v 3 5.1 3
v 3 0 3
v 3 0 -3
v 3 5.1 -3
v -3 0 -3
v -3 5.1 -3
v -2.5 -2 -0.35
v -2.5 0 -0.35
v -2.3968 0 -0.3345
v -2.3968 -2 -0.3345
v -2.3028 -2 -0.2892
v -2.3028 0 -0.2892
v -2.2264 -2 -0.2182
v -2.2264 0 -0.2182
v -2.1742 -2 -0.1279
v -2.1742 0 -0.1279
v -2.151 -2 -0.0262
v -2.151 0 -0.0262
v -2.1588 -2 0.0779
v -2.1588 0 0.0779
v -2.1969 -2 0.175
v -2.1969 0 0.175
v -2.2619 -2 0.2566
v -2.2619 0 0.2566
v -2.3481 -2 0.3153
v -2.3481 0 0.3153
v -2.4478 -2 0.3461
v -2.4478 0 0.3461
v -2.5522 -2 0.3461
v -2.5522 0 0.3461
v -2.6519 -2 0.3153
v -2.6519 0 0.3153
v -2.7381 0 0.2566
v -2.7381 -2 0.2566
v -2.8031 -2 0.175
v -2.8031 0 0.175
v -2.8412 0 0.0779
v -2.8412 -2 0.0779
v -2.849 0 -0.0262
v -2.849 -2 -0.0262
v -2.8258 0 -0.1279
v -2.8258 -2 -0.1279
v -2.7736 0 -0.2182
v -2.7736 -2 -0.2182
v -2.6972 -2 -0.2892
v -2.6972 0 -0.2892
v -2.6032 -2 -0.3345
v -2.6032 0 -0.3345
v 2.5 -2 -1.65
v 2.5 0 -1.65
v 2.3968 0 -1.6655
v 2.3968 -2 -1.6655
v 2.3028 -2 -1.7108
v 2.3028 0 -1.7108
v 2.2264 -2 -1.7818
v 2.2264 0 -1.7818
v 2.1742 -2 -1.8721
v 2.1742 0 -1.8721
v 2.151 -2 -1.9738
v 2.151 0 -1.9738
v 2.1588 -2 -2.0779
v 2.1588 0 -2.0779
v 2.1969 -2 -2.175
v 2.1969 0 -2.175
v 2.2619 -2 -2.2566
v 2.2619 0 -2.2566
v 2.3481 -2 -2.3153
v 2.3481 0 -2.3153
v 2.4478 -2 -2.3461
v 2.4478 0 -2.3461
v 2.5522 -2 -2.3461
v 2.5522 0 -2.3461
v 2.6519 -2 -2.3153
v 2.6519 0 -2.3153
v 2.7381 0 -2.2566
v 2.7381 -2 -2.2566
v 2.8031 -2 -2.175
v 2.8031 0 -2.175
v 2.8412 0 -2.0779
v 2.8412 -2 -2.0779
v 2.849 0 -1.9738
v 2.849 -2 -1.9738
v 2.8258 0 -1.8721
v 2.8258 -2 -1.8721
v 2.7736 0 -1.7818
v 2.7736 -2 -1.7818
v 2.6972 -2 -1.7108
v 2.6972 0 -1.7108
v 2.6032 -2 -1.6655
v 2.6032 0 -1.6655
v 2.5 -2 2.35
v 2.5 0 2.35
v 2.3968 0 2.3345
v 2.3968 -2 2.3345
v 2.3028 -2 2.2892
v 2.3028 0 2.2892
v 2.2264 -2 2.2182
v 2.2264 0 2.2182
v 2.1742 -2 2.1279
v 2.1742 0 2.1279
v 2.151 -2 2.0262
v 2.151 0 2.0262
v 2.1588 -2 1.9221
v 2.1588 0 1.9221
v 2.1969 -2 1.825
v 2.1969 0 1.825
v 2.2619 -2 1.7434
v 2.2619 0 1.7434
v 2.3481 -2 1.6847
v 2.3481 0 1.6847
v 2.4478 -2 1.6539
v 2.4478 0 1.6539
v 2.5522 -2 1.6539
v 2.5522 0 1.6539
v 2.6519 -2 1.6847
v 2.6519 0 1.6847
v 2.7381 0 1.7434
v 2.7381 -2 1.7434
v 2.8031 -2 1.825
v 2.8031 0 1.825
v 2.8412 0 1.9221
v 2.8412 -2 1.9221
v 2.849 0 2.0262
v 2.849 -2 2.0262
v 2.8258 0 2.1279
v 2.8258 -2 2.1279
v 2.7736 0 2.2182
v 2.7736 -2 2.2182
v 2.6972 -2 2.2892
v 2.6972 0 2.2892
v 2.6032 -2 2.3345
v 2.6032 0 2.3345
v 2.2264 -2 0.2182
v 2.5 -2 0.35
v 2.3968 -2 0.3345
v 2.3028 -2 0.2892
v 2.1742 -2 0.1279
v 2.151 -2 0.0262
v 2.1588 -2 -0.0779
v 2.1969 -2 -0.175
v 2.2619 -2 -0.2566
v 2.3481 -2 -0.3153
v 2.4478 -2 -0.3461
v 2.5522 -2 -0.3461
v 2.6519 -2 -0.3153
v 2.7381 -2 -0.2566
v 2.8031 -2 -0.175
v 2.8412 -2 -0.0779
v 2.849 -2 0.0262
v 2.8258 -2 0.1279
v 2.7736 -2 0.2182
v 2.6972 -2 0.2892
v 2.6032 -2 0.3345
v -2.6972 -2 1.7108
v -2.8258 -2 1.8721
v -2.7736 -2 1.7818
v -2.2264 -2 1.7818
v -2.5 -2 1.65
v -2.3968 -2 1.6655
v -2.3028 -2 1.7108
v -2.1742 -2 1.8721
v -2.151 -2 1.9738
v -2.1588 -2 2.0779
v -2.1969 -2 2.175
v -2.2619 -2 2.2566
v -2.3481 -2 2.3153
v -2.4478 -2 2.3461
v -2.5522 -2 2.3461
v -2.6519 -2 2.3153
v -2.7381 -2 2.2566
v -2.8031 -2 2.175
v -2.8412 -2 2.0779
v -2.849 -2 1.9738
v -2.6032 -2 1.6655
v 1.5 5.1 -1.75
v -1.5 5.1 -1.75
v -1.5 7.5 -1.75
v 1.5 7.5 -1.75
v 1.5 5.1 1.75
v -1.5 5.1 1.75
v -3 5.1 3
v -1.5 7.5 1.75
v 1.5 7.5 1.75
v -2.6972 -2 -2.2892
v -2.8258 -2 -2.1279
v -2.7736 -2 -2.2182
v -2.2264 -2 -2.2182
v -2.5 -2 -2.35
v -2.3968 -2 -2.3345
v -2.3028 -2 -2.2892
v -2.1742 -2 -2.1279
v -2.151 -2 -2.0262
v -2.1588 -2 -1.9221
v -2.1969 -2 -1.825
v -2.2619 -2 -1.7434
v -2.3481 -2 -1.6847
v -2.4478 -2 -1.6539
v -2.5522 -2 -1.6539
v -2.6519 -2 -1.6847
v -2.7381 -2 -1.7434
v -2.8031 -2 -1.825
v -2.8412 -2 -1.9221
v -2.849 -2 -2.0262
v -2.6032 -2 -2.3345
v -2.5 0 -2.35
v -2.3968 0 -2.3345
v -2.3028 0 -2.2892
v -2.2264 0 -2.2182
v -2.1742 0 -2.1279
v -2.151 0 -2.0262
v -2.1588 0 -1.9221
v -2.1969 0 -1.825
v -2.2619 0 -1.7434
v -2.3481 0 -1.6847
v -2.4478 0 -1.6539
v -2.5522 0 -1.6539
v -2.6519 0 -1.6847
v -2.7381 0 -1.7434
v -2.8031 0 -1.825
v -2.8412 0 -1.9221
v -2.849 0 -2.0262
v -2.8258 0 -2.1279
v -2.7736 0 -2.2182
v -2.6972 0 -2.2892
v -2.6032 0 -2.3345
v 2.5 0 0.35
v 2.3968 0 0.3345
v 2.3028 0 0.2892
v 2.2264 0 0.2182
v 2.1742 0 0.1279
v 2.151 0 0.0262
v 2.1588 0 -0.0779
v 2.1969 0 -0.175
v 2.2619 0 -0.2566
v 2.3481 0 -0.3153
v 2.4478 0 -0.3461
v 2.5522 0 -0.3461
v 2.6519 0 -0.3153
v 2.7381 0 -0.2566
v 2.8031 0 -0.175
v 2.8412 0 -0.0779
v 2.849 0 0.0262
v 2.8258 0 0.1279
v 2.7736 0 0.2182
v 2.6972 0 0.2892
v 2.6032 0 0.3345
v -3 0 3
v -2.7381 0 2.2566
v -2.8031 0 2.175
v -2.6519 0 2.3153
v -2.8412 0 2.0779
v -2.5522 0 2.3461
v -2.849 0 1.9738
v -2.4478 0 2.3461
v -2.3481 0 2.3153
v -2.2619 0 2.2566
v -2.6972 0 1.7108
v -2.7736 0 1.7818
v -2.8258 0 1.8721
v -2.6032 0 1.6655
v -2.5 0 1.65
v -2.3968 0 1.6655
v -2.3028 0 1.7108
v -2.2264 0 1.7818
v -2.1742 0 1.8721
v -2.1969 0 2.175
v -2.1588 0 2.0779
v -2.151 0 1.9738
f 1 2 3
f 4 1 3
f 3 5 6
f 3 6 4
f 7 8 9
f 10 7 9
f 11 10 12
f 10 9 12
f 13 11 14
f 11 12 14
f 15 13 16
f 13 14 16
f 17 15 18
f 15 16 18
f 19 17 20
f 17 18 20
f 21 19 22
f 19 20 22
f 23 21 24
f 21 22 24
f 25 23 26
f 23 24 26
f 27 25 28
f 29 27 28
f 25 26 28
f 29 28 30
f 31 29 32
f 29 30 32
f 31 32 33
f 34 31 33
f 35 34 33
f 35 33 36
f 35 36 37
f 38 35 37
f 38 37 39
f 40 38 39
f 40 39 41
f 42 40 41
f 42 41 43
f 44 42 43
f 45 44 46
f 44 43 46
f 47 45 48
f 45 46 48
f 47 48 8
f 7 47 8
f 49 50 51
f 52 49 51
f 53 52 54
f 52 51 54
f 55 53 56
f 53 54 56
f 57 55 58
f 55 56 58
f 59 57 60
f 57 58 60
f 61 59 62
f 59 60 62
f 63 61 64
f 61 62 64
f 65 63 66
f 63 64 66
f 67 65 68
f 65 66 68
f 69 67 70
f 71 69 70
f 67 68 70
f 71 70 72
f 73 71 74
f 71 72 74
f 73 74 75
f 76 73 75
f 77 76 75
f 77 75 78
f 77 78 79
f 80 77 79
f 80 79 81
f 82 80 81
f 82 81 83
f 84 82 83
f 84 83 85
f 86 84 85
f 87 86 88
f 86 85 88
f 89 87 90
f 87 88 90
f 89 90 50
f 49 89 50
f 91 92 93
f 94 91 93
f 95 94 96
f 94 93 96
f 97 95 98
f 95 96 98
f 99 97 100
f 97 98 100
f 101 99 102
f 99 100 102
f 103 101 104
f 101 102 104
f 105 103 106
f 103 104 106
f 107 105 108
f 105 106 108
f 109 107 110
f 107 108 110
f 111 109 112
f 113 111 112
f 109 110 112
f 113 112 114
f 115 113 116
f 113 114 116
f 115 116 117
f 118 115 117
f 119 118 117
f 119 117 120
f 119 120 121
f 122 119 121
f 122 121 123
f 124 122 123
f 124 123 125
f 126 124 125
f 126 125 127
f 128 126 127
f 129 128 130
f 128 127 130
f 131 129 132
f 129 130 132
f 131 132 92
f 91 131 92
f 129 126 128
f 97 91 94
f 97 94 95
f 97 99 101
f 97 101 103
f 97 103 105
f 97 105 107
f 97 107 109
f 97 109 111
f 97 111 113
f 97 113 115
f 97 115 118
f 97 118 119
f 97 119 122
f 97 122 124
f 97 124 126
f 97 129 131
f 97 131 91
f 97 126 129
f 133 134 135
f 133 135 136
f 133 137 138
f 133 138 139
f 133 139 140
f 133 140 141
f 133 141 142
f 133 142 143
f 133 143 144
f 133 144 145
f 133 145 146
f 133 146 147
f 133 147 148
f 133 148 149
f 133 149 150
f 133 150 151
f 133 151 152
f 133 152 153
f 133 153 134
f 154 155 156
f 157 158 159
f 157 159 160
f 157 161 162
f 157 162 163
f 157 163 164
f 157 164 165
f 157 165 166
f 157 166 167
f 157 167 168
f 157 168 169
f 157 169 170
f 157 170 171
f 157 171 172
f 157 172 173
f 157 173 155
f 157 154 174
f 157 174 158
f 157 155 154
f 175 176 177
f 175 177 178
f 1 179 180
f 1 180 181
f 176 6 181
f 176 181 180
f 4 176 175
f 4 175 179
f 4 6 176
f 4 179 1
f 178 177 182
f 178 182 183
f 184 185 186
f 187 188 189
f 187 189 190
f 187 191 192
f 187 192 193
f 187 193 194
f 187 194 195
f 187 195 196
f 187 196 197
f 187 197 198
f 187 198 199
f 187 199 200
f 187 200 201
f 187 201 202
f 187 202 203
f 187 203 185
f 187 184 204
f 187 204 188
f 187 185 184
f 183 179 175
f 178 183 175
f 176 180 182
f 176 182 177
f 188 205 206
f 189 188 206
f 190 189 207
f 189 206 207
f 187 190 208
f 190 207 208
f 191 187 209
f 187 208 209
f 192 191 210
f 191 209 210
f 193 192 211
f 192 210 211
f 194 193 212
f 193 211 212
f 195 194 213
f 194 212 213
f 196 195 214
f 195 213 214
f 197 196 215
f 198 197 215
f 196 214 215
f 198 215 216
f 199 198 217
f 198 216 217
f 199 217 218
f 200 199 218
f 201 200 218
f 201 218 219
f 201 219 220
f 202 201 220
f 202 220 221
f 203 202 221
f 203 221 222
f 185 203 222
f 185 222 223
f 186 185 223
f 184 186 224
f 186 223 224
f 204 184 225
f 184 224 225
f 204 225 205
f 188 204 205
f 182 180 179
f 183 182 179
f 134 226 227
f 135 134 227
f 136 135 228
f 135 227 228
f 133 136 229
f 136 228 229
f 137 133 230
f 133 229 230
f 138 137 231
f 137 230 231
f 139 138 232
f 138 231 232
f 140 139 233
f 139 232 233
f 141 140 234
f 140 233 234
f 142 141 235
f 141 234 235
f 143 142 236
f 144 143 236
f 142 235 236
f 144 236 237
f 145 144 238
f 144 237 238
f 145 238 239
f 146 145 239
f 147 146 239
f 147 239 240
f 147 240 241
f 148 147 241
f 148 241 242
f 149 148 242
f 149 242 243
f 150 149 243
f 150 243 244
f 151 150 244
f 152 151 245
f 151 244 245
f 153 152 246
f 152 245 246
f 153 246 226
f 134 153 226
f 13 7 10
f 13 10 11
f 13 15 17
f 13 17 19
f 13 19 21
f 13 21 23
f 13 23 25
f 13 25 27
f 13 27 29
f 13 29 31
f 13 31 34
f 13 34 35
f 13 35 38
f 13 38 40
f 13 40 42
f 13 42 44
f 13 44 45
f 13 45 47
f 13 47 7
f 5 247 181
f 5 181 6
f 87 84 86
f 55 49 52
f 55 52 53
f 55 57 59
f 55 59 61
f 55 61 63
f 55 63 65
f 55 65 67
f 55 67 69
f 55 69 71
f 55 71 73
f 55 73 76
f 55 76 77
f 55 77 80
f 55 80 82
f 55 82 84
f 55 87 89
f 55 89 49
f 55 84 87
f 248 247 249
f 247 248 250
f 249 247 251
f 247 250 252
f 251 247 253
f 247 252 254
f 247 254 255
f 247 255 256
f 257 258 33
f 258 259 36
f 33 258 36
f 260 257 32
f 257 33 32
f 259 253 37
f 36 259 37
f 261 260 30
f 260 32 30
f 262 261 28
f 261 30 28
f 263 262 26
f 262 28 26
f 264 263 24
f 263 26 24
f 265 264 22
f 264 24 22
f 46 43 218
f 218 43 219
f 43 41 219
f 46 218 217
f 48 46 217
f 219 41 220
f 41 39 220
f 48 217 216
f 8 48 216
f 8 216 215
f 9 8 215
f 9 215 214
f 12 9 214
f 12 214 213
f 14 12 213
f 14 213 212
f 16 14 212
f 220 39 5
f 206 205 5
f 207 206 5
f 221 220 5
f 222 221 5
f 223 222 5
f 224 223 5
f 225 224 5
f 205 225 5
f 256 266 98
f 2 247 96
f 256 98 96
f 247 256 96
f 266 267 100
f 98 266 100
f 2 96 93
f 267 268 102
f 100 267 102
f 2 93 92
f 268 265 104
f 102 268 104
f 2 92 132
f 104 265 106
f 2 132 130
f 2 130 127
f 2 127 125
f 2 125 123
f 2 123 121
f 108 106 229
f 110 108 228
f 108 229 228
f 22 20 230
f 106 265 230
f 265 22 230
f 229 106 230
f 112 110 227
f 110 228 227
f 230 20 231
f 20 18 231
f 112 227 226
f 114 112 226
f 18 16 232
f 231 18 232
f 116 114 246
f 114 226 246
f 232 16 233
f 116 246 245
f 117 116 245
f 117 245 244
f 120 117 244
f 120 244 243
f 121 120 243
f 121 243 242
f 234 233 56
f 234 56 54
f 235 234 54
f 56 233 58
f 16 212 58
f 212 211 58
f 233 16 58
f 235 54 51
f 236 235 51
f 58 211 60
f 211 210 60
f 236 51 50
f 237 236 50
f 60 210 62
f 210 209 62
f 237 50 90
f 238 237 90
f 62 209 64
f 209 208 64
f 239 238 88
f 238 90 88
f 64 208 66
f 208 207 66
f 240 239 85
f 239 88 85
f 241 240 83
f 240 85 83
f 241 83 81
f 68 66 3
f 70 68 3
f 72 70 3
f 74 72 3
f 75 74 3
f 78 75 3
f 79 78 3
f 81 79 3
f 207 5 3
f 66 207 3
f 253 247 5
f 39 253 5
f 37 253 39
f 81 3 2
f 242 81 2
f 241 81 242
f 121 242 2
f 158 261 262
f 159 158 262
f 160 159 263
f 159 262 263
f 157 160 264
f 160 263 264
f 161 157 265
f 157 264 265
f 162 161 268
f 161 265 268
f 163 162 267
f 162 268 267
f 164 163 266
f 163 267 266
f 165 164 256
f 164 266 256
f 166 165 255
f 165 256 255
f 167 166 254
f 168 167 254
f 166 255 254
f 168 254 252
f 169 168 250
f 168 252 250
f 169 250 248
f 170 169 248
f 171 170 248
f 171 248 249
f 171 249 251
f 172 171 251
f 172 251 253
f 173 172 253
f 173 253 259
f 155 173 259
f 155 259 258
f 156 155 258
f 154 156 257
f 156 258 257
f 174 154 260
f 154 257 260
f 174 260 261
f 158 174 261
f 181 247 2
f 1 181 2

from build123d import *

# Parameters (mm, degrees)
SKETCH1_W           = 6
SKETCH1_H           = 6
BOSS_EXTRUDE1_DEPTH = 5.1
SKETCH2_W           = 3
SKETCH2_H           = 3.5
BOSS_EXTRUDE2_DEPTH = 2.4
SKETCH3_R           = 0.35
BOSS_EXTRUDE3_DEPTH = 2


with BuildPart() as part:
    # Sketch1 → Boss-Extrude1 (new body)
    with BuildSketch(Plane(origin=(0, 0, 0), x_dir=(1, 0, 0), z_dir=(0, 1, 0))):
        Rectangle(SKETCH1_W, SKETCH1_H)
    extrude(amount=BOSS_EXTRUDE1_DEPTH)

    # Sketch2 → Boss-Extrude2 (add)
    with BuildSketch(Plane(origin=(0, 5.1, 0), x_dir=(1, 0, 0), z_dir=(0, 1, 0))):
        Rectangle(SKETCH2_W, SKETCH2_H)
    extrude(amount=BOSS_EXTRUDE2_DEPTH)

    # Sketch3 → Boss-Extrude3 (add)
    with BuildSketch(Plane.XZ):
        with Locations(Location((-2.5, 0, 0), (0, 0, 270))):
            Circle(SKETCH3_R)
        with Locations(Location((-2.5, -2, 0), (0, 0, 270))):
            Circle(SKETCH3_R)
        with Locations(Location((-2.5, 2, 0), (0, 0, 270))):
            Circle(SKETCH3_R)
        with Locations(Location((2.5, -2, 0), (0, 0, 90))):
            Circle(SKETCH3_R)
        with Locations(Location((2.5, 0, 0), (0, 0, 90))):
            Circle(SKETCH3_R)
        with Locations(Location((2.5, 2, 0), (0, 0, 90))):
            Circle(SKETCH3_R)
    extrude(amount=BOSS_EXTRUDE3_DEPTH)


solid = part.part
